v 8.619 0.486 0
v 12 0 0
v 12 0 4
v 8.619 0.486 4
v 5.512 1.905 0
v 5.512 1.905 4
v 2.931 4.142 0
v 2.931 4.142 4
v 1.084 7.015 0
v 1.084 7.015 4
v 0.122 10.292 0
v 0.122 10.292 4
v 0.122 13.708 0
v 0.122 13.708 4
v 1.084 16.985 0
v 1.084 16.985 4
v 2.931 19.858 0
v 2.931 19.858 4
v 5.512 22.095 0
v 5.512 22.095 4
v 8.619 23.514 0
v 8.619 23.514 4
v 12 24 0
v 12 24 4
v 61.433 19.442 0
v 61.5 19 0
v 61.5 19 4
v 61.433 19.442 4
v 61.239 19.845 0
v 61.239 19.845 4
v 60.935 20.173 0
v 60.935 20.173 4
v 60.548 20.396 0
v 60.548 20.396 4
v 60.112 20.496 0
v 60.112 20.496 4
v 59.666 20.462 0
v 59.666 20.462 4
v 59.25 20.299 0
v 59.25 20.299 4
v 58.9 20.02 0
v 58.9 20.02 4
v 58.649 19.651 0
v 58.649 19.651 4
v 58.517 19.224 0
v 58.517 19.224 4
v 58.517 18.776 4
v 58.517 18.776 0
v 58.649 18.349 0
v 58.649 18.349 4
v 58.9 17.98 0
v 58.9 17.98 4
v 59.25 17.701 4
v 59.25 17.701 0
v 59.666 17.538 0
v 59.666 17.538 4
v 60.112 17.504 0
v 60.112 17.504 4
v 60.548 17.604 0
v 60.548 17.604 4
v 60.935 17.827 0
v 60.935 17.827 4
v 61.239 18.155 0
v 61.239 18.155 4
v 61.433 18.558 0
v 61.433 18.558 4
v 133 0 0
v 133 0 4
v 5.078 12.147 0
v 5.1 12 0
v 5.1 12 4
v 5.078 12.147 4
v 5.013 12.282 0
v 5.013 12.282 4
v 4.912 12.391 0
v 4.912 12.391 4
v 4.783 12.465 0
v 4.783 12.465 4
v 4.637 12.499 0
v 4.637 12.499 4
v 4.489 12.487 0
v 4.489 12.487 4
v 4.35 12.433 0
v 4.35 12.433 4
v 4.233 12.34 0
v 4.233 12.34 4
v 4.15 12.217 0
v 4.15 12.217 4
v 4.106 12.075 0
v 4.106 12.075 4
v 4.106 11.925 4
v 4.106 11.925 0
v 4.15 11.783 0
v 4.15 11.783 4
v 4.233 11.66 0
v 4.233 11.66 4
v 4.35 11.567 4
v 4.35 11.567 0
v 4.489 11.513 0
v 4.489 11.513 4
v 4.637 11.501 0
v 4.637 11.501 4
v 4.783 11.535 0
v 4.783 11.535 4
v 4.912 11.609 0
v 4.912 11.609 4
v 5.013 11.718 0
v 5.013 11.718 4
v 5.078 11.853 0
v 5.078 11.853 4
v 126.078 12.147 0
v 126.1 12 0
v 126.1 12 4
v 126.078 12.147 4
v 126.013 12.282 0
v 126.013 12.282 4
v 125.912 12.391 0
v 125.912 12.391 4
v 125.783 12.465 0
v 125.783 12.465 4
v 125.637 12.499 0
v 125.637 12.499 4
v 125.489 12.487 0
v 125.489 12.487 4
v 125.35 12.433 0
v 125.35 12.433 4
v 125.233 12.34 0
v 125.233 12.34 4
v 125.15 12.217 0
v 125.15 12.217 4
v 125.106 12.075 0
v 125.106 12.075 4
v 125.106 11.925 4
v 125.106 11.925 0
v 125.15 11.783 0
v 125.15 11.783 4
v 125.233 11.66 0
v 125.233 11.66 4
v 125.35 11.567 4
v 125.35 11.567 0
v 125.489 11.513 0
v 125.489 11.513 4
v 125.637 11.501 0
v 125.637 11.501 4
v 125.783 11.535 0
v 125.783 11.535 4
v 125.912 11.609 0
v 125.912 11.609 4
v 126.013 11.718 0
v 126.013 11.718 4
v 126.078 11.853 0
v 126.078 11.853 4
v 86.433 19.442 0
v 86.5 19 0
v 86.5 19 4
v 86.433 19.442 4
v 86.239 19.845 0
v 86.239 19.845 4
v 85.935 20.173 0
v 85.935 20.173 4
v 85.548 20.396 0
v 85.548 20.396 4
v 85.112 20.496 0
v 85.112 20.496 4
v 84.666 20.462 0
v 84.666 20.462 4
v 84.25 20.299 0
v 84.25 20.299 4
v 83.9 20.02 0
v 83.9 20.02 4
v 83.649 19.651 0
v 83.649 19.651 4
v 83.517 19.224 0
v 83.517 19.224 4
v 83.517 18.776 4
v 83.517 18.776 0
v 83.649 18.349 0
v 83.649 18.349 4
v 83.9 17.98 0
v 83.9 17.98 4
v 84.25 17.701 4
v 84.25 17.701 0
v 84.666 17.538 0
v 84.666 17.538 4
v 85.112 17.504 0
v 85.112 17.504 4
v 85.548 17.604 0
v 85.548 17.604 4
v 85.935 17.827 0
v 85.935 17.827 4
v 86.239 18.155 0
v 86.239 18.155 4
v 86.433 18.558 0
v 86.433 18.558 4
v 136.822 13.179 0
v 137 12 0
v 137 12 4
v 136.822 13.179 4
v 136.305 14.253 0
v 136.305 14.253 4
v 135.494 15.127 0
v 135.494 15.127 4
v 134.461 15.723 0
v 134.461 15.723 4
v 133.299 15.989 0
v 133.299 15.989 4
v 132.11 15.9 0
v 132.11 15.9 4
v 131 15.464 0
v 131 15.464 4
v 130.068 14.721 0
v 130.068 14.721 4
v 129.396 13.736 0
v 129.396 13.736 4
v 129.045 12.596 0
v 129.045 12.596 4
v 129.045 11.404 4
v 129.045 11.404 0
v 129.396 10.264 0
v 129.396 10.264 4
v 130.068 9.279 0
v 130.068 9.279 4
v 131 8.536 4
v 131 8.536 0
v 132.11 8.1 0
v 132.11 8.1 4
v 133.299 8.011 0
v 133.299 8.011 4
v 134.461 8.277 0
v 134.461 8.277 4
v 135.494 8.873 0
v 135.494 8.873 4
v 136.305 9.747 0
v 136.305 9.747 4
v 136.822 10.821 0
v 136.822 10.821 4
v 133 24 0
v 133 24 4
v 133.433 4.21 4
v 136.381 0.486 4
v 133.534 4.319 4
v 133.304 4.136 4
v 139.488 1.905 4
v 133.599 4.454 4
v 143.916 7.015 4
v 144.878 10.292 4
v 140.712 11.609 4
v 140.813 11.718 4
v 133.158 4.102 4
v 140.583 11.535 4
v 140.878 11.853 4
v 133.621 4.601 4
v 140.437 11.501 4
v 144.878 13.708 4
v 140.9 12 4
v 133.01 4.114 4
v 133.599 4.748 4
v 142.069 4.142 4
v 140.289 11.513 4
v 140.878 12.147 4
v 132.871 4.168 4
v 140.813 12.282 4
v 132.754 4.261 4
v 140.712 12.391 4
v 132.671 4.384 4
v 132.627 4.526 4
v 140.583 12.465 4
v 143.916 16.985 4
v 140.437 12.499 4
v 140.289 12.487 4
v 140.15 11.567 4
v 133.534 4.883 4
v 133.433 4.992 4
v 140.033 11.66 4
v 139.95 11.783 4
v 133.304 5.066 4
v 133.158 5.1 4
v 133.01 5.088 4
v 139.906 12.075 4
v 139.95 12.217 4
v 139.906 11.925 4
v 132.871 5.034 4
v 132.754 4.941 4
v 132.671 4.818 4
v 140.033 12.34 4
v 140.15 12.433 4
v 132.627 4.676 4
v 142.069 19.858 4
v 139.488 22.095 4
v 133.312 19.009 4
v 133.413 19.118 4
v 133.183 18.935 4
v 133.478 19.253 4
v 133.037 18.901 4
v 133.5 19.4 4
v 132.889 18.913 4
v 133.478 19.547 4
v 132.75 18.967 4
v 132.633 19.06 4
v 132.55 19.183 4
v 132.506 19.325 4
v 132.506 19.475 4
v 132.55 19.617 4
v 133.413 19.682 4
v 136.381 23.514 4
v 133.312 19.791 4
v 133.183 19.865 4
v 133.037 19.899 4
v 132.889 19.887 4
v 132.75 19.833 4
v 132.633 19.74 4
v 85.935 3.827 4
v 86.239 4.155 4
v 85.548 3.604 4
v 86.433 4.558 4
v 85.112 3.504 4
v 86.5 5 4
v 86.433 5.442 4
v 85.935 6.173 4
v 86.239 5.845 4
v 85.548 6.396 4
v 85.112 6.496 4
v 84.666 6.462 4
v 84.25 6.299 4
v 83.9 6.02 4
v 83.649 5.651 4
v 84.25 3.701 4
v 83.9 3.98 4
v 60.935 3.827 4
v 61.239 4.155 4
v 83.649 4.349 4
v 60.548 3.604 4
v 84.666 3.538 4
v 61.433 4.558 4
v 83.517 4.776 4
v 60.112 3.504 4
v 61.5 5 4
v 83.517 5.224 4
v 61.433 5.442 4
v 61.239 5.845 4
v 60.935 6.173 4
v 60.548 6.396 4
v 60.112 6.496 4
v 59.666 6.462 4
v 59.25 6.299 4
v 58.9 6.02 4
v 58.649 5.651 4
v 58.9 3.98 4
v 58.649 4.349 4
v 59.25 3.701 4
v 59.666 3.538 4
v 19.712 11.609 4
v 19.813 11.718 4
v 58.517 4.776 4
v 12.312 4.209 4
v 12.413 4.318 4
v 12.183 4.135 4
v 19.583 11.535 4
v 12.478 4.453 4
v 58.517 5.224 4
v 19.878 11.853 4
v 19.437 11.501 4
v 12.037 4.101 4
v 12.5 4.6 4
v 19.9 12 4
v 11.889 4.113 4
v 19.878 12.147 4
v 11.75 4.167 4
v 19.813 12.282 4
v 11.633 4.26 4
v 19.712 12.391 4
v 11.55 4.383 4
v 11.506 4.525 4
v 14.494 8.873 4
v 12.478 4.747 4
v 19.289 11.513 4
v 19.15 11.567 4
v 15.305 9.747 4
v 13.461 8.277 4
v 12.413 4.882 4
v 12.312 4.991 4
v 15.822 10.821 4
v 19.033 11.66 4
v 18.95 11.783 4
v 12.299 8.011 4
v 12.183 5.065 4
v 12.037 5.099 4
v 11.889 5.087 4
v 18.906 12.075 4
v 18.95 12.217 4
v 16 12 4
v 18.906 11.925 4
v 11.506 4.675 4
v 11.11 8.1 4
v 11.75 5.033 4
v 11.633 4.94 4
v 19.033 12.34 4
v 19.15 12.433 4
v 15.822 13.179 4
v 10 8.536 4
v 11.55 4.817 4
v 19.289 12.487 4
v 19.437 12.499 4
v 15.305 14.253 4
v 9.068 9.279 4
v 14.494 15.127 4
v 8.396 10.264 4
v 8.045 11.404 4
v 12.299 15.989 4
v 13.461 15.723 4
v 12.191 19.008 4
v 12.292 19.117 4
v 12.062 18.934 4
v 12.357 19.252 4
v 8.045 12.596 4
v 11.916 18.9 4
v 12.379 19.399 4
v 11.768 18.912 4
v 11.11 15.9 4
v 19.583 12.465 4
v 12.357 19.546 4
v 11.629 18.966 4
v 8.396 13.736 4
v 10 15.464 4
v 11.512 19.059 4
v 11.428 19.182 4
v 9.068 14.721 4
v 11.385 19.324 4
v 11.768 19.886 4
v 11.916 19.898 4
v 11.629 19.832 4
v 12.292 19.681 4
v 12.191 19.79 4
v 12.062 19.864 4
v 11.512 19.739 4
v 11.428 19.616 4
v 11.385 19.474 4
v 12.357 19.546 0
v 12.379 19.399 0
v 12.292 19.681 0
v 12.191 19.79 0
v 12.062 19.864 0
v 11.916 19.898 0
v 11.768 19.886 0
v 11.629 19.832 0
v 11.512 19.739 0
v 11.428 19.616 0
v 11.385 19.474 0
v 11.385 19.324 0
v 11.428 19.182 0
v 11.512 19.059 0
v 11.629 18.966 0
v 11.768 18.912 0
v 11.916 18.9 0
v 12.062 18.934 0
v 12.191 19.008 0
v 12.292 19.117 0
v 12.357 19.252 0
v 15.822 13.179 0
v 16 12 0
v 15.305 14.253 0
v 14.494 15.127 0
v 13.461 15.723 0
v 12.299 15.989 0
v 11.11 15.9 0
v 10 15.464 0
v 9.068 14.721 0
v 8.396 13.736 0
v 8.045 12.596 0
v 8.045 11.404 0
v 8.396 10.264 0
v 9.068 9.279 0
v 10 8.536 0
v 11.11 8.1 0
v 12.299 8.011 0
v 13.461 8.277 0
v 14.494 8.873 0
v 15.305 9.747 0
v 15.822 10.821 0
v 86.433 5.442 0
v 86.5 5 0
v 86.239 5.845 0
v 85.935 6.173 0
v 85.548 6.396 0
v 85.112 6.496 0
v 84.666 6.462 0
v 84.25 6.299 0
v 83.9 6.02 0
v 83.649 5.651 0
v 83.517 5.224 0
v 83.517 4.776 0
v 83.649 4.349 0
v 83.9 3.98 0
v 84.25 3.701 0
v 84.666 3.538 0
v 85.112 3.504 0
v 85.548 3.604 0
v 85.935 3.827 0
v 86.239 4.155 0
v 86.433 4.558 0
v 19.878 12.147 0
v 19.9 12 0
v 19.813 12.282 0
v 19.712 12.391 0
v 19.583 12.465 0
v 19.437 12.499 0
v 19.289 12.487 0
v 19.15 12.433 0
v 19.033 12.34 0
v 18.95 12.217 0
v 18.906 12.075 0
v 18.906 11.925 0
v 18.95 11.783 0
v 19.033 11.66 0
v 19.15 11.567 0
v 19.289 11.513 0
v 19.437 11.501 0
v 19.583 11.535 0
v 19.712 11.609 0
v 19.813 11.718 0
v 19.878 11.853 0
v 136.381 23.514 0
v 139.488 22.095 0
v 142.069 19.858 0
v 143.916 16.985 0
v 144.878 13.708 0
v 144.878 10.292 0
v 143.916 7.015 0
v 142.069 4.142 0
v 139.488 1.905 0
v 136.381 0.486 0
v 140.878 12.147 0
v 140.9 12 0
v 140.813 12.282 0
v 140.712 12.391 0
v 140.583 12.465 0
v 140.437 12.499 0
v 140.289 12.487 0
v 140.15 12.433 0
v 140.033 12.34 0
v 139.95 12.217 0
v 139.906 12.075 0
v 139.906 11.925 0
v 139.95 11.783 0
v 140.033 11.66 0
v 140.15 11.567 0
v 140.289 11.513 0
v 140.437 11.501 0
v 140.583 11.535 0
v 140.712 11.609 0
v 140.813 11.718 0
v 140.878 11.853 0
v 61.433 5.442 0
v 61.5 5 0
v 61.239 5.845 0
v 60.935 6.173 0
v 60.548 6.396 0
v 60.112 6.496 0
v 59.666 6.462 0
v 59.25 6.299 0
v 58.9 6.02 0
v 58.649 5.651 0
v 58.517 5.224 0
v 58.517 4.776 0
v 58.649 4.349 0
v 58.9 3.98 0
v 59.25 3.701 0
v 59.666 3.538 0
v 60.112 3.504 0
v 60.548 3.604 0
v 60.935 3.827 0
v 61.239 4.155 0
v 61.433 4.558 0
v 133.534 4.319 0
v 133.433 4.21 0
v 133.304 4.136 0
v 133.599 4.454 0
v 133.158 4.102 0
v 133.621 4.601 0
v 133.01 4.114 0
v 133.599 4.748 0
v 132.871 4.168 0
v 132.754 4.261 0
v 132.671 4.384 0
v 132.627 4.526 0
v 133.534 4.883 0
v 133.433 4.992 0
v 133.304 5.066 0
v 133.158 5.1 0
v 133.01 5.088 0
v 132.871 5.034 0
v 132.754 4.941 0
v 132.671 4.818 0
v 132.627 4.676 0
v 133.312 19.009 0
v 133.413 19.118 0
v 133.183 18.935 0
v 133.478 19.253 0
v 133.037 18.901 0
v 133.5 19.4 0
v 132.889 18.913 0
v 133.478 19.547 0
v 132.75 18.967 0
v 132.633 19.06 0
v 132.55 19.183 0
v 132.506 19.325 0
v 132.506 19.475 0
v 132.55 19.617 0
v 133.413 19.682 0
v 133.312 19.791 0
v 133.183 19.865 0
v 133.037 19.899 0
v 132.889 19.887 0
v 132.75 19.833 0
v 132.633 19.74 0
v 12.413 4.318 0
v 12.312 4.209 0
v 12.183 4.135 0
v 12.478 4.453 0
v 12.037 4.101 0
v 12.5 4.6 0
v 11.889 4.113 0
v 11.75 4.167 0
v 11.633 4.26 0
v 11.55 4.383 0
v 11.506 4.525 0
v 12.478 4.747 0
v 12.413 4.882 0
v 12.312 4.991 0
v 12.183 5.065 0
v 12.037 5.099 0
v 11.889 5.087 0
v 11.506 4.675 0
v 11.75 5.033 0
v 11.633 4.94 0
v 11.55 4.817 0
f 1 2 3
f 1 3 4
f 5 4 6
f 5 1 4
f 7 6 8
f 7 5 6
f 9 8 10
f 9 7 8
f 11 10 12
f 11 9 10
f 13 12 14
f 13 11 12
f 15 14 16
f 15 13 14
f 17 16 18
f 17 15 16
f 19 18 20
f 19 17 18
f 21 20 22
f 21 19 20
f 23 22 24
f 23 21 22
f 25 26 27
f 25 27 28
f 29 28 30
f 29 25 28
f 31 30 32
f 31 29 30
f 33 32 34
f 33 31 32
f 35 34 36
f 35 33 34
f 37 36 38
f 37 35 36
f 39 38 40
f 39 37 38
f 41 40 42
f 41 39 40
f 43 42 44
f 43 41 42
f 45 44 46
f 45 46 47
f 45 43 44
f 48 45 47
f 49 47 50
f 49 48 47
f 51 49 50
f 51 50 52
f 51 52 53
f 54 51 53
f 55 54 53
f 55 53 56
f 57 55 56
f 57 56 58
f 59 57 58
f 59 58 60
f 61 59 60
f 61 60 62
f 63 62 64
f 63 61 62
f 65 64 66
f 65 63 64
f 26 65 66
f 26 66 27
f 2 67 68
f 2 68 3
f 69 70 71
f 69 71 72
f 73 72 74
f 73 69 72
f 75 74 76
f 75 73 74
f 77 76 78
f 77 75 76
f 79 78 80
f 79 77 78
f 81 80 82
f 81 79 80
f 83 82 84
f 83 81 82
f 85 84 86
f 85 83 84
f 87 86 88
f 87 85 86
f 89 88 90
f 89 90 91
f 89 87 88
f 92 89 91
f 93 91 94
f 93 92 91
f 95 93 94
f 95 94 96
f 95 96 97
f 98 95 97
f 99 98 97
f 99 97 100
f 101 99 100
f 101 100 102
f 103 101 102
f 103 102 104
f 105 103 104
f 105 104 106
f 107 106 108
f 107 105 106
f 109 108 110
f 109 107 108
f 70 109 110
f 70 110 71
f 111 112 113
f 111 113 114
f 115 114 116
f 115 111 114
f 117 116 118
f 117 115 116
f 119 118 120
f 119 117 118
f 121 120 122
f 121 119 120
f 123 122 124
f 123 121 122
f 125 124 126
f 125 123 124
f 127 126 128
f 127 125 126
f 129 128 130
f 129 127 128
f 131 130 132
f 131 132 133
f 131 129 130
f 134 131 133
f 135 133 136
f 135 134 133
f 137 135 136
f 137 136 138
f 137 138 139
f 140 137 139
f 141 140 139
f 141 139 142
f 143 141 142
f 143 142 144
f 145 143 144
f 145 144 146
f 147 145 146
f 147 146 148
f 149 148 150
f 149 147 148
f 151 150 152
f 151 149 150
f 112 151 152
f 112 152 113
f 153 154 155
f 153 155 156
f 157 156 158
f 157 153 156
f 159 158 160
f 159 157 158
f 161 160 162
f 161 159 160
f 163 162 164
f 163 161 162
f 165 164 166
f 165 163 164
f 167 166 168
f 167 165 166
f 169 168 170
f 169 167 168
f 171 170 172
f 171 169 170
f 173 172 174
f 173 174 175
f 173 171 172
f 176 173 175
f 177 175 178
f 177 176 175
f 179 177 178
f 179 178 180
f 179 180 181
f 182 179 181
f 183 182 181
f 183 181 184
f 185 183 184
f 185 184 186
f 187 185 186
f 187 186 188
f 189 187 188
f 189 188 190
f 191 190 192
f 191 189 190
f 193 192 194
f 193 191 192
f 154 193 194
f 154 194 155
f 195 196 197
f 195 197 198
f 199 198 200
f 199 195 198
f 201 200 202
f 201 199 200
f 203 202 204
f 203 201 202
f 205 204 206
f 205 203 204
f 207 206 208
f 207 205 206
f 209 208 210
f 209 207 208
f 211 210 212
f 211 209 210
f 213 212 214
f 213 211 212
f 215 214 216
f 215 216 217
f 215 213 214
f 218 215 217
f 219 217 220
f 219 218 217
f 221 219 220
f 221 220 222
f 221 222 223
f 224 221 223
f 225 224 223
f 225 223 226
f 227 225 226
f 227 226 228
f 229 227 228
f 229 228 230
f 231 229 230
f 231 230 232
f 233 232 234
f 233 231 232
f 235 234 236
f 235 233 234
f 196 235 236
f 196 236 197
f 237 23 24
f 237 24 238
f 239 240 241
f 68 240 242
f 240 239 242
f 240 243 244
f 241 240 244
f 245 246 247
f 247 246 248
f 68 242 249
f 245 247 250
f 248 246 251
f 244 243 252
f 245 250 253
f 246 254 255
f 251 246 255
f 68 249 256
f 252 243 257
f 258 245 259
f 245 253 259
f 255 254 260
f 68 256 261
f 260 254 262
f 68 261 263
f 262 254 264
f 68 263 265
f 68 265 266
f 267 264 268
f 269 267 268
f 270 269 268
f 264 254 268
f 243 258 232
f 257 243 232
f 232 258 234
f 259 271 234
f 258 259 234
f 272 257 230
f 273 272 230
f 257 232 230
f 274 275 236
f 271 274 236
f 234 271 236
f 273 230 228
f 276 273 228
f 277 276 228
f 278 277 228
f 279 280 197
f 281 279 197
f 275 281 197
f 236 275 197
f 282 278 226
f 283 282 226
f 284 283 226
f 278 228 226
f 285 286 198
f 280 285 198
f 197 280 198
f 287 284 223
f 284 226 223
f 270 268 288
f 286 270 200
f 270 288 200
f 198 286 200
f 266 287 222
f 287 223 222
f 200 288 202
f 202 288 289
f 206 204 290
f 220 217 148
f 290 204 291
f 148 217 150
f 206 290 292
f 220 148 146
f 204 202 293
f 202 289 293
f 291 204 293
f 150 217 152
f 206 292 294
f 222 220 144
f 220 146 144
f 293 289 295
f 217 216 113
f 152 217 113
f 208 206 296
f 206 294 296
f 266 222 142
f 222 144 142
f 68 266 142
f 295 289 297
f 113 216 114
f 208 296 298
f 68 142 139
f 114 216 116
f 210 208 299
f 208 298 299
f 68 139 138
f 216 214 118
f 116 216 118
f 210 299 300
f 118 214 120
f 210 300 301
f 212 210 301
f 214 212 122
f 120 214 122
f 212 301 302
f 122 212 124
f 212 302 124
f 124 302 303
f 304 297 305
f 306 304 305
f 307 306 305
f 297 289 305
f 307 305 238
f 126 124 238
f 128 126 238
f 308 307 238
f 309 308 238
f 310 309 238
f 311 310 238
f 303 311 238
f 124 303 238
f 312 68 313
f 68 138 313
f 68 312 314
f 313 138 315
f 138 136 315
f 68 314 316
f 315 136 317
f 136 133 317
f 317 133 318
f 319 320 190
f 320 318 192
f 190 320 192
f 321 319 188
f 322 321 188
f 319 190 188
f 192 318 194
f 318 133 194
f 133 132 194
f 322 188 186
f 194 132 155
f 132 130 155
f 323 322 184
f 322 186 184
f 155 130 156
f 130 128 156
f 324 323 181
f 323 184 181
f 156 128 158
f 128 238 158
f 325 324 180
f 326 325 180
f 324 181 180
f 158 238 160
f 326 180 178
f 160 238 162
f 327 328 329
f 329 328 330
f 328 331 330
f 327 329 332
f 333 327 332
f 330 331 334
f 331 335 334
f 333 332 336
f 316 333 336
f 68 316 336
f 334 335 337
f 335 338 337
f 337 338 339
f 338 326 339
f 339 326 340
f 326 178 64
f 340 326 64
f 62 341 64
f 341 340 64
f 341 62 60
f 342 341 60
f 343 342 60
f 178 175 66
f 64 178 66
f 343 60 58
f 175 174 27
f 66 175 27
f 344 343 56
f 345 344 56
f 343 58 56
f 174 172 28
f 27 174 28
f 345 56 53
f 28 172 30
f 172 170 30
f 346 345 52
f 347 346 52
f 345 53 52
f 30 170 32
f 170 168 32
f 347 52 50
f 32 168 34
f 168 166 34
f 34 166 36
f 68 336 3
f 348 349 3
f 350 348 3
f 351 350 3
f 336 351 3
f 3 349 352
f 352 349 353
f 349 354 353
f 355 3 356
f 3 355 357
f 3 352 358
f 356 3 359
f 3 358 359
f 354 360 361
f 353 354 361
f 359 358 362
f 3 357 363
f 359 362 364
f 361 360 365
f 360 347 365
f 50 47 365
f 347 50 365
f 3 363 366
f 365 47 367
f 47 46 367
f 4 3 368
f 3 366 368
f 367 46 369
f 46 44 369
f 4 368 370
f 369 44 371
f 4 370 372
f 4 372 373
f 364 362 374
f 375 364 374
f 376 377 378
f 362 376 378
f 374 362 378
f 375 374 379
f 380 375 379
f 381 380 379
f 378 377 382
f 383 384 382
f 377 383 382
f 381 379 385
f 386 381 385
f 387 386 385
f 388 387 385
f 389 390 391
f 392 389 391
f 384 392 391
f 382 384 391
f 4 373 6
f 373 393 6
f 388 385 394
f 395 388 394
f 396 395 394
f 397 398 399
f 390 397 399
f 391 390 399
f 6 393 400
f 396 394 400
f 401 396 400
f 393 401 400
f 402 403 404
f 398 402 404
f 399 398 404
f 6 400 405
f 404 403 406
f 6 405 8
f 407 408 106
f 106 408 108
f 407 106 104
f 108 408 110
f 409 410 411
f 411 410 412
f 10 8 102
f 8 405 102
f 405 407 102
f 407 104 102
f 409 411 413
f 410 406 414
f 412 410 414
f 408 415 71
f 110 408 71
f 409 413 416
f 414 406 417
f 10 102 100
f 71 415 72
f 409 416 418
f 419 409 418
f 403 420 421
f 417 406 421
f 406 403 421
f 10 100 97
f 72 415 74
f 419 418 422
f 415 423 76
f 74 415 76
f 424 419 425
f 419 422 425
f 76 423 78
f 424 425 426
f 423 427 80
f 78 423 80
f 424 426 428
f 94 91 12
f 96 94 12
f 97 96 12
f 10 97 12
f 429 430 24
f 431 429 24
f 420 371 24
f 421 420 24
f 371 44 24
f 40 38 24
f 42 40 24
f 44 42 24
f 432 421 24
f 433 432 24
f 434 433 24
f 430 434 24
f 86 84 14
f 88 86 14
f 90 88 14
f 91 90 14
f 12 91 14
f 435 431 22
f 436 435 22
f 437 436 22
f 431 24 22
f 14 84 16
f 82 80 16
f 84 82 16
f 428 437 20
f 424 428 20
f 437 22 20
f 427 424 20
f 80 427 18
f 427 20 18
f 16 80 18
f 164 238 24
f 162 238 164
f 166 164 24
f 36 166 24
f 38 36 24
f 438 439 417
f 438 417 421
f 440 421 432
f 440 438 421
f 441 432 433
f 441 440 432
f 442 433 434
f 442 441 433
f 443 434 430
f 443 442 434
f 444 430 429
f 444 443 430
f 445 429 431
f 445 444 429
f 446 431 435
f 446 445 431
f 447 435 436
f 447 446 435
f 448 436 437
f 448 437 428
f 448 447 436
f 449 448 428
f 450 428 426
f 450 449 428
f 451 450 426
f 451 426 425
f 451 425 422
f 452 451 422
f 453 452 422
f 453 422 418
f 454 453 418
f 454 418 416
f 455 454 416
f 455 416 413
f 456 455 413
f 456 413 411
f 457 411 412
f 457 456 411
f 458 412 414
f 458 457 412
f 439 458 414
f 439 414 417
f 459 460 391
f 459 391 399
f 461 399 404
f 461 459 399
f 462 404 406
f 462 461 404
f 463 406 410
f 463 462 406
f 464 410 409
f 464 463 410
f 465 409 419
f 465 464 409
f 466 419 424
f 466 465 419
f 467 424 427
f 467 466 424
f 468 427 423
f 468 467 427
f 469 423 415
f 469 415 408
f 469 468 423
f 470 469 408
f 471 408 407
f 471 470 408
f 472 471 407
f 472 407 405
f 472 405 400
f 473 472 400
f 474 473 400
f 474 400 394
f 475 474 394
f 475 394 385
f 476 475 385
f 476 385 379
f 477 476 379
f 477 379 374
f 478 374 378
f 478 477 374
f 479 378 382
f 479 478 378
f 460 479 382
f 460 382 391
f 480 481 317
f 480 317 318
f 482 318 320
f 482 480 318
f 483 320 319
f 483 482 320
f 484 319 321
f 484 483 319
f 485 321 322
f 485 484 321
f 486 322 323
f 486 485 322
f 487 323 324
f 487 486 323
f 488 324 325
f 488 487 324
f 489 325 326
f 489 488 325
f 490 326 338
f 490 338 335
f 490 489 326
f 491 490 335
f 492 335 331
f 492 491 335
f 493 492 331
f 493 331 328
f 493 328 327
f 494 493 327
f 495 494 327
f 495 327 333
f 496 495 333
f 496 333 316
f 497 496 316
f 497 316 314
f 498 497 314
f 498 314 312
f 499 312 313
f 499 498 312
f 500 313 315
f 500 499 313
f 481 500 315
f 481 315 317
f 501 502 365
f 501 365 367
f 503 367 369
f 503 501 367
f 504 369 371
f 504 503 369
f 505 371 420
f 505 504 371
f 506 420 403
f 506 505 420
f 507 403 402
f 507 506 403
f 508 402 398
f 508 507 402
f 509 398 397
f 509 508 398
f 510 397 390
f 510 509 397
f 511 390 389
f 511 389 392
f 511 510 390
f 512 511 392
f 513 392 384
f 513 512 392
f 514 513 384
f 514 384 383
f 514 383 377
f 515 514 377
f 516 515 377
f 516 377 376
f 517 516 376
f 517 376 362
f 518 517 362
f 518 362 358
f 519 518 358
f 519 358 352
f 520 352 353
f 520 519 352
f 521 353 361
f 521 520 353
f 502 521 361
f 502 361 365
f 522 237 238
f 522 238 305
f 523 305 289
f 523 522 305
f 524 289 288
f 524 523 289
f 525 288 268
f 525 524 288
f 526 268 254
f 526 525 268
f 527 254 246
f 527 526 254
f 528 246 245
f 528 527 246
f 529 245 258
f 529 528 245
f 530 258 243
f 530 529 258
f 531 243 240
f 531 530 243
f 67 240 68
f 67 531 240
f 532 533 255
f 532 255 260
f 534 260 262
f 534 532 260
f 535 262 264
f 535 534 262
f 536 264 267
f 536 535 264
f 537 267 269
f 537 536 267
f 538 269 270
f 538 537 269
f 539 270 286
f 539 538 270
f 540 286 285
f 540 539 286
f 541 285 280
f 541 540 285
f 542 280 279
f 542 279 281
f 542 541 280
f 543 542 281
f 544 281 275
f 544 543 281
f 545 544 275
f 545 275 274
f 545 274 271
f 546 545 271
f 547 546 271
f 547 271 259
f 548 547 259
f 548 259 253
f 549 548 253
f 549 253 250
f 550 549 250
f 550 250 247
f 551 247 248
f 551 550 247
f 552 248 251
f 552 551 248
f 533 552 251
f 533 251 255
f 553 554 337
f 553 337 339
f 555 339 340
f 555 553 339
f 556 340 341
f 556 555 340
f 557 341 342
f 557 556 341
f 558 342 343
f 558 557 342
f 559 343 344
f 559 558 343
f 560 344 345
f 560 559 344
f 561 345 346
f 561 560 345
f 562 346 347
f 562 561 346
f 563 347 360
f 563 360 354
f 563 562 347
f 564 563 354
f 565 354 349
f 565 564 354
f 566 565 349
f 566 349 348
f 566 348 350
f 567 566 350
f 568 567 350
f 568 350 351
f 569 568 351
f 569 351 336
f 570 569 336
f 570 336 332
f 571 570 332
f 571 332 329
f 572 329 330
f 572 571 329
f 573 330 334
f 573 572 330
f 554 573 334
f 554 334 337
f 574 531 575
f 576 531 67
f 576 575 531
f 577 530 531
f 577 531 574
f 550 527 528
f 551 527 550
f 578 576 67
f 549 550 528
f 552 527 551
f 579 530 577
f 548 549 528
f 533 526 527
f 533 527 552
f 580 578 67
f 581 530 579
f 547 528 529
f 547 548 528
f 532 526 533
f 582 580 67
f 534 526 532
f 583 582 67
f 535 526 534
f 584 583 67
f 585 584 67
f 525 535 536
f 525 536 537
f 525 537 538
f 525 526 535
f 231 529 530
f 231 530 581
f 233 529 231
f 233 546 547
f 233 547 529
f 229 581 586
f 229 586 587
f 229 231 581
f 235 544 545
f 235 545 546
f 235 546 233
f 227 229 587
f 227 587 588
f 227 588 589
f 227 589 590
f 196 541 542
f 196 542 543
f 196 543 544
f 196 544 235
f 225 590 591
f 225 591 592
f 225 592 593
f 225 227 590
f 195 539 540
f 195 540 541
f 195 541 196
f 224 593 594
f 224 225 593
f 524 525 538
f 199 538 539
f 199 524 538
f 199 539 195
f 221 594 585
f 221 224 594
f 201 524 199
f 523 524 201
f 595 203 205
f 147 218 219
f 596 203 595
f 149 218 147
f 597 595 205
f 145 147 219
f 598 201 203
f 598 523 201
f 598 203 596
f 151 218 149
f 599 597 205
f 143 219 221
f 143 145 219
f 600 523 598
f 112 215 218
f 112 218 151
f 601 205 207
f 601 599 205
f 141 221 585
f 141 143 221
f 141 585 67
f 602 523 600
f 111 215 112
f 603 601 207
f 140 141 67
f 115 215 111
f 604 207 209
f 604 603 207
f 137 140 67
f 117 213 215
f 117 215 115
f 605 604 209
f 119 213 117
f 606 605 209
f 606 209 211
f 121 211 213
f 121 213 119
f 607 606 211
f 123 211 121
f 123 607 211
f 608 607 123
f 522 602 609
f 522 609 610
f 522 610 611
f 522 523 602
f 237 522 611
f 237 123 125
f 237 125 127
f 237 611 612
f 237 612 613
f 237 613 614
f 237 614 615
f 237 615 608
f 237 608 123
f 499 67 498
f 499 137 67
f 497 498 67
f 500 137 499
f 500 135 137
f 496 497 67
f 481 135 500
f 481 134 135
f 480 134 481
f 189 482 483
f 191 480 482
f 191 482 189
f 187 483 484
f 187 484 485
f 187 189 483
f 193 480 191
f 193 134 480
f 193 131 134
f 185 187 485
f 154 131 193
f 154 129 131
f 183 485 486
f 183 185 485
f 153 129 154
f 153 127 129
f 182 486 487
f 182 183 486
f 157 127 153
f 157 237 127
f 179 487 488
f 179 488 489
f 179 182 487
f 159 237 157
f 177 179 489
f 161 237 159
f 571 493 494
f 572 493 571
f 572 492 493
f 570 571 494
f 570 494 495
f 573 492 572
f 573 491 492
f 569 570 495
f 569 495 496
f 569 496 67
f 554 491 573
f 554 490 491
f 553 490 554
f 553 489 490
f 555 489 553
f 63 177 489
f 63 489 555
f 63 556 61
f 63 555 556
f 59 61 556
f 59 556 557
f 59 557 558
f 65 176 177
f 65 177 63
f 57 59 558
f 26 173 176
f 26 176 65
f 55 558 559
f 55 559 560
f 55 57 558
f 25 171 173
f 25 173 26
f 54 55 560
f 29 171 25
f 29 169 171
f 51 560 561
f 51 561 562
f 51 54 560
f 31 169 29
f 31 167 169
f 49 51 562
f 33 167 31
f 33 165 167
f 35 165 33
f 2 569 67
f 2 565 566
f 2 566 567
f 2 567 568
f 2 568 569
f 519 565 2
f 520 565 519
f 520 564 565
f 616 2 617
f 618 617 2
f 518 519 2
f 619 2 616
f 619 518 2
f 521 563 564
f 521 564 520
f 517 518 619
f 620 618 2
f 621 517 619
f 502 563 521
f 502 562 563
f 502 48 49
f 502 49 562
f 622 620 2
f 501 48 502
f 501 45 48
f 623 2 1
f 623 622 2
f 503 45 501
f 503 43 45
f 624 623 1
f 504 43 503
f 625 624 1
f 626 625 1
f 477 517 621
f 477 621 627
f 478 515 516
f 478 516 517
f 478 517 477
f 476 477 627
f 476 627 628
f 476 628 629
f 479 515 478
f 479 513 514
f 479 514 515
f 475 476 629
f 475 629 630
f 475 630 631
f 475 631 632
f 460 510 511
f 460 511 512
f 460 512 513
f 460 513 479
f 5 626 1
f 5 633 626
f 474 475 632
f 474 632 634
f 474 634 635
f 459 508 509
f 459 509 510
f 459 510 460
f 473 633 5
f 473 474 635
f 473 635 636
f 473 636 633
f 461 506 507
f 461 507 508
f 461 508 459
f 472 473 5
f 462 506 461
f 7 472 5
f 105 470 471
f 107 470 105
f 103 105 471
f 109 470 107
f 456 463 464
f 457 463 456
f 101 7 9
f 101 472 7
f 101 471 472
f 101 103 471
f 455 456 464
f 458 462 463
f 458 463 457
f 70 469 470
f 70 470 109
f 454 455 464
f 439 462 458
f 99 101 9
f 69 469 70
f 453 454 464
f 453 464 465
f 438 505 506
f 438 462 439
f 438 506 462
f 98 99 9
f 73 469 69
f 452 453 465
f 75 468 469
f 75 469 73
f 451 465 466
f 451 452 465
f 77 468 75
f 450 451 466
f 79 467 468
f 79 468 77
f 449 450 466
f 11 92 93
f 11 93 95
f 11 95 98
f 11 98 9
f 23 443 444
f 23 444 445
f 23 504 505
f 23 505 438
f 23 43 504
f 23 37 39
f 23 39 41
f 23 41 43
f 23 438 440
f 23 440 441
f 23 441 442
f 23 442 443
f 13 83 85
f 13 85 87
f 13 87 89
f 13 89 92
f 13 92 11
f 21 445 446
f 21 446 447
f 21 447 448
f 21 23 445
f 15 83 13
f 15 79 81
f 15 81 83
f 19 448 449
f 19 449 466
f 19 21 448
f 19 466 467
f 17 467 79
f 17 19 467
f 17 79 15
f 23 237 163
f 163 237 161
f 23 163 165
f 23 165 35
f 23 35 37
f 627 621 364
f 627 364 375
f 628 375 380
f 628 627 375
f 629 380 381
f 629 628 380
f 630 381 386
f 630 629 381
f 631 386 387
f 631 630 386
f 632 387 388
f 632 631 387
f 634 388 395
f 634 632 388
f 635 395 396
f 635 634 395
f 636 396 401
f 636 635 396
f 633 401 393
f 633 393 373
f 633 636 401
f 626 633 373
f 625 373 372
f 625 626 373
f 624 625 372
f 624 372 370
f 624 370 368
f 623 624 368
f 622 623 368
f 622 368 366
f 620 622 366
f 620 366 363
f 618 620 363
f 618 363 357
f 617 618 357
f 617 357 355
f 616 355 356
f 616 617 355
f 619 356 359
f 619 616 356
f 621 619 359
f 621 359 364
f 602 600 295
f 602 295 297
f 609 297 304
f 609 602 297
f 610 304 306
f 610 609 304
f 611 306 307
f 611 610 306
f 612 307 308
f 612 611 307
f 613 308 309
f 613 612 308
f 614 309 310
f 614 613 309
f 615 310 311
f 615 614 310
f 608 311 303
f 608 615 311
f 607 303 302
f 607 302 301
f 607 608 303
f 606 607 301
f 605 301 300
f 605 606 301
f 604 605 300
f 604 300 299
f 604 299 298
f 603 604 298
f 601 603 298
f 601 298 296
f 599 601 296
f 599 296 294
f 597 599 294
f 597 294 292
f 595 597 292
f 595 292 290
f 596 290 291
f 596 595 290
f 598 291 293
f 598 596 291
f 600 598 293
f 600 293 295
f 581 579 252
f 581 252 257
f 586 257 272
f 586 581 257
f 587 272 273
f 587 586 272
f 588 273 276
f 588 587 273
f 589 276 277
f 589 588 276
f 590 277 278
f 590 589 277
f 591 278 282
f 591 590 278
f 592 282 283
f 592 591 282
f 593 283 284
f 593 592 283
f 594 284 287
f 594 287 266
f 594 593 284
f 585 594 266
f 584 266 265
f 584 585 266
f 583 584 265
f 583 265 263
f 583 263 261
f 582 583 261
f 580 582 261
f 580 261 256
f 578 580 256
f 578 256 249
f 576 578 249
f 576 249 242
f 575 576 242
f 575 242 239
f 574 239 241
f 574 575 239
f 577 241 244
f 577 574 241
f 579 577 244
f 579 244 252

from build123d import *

# Parameters (mm, degrees)
SKETCH1_R           = 4
SKETCH1_R_2         = 0.5
SKETCH1_R_3         = 1.5
BOSS_EXTRUDE1_DEPTH = 4


with BuildPart() as part:
    # Sketch1 → Boss-Extrude1 (new body)
    with BuildSketch(Plane.XY):
        with BuildLine():
            Line((12, 24), (133, 24))
            ThreePointArc((133, 24), (145, 12), (133, 0))
            Line((133, 0), (12, 0))
            ThreePointArc((12, 0), (0, 12), (12, 24))
        make_face()
        with Locations((133, 12)):
            Circle(SKETCH1_R, mode=Mode.SUBTRACT)
        with Locations((133, 19.4)):
            Circle(SKETCH1_R_2, mode=Mode.SUBTRACT)
        with Locations((133.121025162, 4.600989734)):
            Circle(SKETCH1_R_2, mode=Mode.SUBTRACT)
        with Locations((140.4, 12)):
            Circle(SKETCH1_R_2, mode=Mode.SUBTRACT)
        with Locations((125.6, 12)):
            Circle(SKETCH1_R_2, mode=Mode.SUBTRACT)
        with Locations((60, 5)):
            Circle(SKETCH1_R_3, mode=Mode.SUBTRACT)
        with Locations((60, 19)):
            Circle(SKETCH1_R_3, mode=Mode.SUBTRACT)
        with Locations((85, 5)):
            Circle(SKETCH1_R_3, mode=Mode.SUBTRACT)
        with Locations((85, 19)):
            Circle(SKETCH1_R_3, mode=Mode.SUBTRACT)
        with Locations((12, 12)):
            Circle(SKETCH1_R, mode=Mode.SUBTRACT)
        with Locations((12, 4.6)):
            Circle(SKETCH1_R_2, mode=Mode.SUBTRACT)
        with Locations((11.878974838, 19.399010266)):
            Circle(SKETCH1_R_2, mode=Mode.SUBTRACT)
        with Locations((4.6, 12)):
            Circle(SKETCH1_R_2, mode=Mode.SUBTRACT)
        with Locations((19.4, 12)):
            Circle(SKETCH1_R_2, mode=Mode.SUBTRACT)
    extrude(amount=BOSS_EXTRUDE1_DEPTH)


solid = part.part
